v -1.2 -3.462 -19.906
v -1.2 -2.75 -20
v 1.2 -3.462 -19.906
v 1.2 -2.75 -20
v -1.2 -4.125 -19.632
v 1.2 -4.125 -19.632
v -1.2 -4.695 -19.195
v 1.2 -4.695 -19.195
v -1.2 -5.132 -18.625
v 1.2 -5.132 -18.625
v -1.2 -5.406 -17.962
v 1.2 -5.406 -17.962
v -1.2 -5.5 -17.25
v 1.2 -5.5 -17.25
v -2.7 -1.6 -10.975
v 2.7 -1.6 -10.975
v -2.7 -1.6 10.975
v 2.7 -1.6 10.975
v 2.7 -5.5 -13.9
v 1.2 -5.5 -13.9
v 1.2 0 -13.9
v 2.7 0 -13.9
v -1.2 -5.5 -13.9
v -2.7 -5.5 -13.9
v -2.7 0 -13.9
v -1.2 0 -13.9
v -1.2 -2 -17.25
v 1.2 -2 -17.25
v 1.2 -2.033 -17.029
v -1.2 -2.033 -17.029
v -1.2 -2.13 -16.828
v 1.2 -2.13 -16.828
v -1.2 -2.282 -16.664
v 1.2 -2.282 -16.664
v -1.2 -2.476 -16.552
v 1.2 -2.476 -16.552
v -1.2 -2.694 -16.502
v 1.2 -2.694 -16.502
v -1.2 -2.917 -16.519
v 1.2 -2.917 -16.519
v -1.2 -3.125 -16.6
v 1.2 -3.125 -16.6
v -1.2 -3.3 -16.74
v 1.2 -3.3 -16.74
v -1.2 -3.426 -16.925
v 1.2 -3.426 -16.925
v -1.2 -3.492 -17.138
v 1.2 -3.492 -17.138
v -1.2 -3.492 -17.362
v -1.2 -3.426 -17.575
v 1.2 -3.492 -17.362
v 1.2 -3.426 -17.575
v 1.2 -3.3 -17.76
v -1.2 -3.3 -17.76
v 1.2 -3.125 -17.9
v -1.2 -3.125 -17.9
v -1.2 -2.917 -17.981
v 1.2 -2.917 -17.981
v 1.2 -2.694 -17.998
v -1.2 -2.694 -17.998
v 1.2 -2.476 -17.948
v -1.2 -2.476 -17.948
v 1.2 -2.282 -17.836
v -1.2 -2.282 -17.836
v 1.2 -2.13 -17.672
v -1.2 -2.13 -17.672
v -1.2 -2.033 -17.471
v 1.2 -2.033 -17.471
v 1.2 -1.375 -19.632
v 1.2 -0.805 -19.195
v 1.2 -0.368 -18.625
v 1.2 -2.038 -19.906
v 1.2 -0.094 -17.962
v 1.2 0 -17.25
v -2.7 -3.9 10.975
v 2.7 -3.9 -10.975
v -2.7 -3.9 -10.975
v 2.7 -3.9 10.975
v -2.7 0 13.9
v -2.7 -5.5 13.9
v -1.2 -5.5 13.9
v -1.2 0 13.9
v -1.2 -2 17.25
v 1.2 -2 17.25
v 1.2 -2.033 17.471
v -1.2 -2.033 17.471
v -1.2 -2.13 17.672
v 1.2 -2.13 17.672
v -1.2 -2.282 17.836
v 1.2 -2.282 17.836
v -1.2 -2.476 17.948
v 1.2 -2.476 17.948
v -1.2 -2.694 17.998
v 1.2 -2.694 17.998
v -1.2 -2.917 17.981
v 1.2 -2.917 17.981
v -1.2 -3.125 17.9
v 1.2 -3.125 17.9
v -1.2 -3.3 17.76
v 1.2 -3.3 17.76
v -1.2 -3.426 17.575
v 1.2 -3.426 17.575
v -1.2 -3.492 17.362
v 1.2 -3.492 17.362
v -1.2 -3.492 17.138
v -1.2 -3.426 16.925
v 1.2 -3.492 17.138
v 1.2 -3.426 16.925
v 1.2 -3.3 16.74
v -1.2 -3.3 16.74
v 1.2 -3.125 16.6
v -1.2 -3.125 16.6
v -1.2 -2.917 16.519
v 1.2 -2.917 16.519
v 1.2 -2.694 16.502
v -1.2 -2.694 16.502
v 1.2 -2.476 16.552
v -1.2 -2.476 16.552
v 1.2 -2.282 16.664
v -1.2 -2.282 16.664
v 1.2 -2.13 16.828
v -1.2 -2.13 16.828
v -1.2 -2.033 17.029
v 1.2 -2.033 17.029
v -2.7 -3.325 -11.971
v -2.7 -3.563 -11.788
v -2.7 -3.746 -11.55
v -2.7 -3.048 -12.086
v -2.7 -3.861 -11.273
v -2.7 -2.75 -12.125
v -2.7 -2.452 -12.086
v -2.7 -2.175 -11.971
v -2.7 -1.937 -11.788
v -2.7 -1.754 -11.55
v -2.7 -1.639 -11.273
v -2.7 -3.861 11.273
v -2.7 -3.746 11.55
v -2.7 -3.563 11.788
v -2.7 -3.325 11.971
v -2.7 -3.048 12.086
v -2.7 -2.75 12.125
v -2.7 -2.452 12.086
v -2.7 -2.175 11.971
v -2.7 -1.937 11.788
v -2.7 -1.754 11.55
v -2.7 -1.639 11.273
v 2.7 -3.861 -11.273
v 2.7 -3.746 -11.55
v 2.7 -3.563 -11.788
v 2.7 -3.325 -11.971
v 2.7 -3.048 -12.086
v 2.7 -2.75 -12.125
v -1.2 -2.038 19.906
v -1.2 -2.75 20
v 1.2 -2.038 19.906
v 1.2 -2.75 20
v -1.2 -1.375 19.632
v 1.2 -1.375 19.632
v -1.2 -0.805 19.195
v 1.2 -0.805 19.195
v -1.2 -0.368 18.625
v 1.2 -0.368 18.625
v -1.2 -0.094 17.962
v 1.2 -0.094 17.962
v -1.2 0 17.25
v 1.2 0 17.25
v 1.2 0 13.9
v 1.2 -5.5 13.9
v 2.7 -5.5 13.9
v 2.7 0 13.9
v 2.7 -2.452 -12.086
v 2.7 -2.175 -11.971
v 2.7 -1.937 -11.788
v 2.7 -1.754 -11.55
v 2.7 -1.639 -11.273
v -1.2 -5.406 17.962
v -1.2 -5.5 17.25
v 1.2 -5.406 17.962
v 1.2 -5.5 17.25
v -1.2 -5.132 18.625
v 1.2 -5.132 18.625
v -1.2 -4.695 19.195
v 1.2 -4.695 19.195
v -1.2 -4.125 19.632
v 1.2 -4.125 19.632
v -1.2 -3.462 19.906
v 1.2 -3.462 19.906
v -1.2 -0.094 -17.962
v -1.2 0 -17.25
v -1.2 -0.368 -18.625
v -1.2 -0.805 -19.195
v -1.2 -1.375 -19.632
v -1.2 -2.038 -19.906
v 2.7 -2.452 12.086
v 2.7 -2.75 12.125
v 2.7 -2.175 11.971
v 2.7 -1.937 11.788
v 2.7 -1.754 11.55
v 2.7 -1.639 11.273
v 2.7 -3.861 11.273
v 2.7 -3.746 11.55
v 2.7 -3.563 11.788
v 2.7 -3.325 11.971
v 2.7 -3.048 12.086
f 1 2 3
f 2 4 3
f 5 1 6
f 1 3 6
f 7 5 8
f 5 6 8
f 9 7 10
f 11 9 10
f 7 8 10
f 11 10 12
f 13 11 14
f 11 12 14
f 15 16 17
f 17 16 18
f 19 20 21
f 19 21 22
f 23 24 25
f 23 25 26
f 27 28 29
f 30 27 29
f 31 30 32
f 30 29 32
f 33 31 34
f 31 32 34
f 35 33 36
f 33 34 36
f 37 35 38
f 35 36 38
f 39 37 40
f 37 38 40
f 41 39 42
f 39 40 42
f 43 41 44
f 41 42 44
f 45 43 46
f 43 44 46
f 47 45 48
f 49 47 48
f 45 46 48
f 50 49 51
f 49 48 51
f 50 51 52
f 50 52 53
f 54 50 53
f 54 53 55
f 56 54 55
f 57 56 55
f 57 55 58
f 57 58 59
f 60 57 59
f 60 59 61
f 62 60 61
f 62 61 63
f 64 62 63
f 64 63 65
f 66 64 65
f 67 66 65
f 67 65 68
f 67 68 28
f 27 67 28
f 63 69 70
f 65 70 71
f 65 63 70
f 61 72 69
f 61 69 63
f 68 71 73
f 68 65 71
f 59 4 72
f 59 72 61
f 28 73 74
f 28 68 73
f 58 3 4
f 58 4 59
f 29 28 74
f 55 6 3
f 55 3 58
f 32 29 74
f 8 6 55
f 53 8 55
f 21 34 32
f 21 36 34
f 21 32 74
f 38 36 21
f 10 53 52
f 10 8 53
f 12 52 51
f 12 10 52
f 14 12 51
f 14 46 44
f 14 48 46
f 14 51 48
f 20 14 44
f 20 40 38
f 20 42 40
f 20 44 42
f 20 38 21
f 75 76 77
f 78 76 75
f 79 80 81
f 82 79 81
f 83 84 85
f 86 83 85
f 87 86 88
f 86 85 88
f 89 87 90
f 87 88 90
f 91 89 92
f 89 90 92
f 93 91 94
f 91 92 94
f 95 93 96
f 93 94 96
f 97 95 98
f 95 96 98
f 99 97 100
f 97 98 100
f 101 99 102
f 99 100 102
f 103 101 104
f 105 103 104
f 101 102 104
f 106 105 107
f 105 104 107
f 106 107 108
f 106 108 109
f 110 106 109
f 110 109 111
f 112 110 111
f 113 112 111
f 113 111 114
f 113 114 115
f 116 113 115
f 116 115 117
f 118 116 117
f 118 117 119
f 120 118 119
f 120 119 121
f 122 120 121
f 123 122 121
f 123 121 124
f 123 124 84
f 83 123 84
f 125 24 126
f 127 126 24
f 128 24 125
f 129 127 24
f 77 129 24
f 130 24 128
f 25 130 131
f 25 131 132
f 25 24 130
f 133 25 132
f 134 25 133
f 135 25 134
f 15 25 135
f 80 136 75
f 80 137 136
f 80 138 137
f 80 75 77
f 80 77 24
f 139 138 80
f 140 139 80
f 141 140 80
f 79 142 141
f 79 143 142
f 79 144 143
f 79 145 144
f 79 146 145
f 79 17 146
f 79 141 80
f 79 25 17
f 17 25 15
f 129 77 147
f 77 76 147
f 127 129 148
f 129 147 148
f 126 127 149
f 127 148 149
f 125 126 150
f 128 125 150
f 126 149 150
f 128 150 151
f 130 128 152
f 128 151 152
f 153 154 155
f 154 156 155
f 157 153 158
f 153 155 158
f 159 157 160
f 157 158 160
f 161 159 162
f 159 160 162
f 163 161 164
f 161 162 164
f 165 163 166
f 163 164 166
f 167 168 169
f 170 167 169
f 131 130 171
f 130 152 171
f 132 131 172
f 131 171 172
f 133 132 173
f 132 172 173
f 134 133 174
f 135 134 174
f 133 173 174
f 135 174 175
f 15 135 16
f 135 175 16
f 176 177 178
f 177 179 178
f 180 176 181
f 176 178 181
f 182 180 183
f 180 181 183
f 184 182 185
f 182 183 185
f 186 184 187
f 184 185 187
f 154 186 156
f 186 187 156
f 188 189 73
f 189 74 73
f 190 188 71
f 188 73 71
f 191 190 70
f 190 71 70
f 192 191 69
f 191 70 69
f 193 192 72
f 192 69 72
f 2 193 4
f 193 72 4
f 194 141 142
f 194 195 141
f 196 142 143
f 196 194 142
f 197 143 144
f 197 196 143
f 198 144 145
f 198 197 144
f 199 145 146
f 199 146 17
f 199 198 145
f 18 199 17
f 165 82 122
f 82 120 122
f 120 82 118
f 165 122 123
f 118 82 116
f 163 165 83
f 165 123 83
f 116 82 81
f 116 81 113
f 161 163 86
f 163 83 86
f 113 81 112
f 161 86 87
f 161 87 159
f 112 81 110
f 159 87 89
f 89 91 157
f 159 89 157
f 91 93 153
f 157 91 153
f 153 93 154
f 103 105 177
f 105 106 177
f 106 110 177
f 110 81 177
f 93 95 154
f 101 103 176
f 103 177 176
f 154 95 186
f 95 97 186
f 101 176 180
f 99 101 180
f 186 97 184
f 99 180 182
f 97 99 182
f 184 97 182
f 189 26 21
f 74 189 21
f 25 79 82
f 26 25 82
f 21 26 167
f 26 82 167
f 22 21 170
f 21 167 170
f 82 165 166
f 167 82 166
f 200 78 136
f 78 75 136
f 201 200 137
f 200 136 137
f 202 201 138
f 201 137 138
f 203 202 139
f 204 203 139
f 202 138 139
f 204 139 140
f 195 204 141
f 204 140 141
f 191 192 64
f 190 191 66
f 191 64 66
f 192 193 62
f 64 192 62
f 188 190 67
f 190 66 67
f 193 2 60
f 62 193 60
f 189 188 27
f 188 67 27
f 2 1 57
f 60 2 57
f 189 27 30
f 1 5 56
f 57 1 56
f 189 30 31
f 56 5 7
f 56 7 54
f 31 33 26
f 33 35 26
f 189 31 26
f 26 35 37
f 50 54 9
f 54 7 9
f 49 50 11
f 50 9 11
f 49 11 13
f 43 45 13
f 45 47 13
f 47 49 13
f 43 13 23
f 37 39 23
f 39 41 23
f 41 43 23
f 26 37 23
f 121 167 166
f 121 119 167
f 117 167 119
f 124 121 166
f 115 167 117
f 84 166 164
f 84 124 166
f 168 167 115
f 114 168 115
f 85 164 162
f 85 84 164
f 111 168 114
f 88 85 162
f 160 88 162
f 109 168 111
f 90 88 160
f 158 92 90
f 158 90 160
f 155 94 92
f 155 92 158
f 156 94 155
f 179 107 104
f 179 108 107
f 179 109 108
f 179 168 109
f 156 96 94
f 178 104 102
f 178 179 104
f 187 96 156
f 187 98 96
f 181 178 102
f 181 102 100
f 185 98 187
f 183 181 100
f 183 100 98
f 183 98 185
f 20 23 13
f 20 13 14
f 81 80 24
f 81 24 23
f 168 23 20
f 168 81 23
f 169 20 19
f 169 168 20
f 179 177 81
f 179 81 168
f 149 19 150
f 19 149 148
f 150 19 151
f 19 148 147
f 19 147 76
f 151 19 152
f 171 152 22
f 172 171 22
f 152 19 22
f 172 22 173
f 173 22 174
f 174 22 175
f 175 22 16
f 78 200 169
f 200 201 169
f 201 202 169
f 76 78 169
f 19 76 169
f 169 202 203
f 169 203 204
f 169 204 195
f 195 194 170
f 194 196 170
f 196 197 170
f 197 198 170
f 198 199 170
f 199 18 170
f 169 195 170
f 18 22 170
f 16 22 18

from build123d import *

# Parameters (mm, degrees)
F0_W      = 5.4
F0_H      = 40
F1_DEPTH  = 5.5
F2_W      = 1.5
F2_H      = 6.1
F3_DEPTH  = 5.501
F4_W      = 1.5
F4_H      = 6.1
F5_DEPTH  = 25
F6_W      = 1.5
F6_H      = 6.1
F7_DEPTH  = 5.501
F8_W      = 1.5
F8_H      = 6.1
F9_DEPTH  = 5.501
F10_R     = 2.75
F11_R     = 2.74999
F12_R     = 2.75
F13_R     = 2.74999
F14_W     = 2.3
F14_H     = 24.25
F15_DEPTH = 2.701
F16_DEPTH = 2.701
F17_R     = 1.15
F18_R     = 1.14999
F19_R     = 1.15
F20_R     = 1.14999
F21_R     = 0.75
F22_DEPTH = 3.901
F23_R     = 0.75
F24_DEPTH = 3.901


# Not quite as in the source:
# - a fillet or chamfer is up to 0.001 mm smaller than in the source, because OpenCascade refuses the exact size


with BuildPart() as f1:
    # F0 (on Front) → F1 (new body)
    with BuildSketch(Plane.XZ):
        Rectangle(F0_W, F0_H)
    extrude(amount=F1_DEPTH)

    # F2 (on face) → F3 (cut, through all)
    with BuildSketch(Plane.XZ.offset(5.5)):
        with Locations((-1.95, 16.95)):
            Rectangle(F2_W, F2_H)
    extrude(amount=-F3_DEPTH, mode=Mode.SUBTRACT)

    # F4 (on face) → F5 (cut)
    with BuildSketch(Plane.XZ.offset(5.5)):
        with Locations((1.95, 16.95)):
            Rectangle(F4_W, F4_H)
    extrude(amount=-F5_DEPTH, mode=Mode.SUBTRACT)

    # F6 (on face) → F7 (cut, through all)
    with BuildSketch(Plane.XZ.offset(5.5)):
        with Locations((-1.95, -16.95)):
            Rectangle(F6_W, F6_H)
    extrude(amount=-F7_DEPTH, mode=Mode.SUBTRACT)

    # F8 (on face) → F9 (cut, through all)
    with BuildSketch(Plane.XZ.offset(5.5)):
        with Locations((1.95, -16.95)):
            Rectangle(F8_W, F8_H)
    extrude(amount=-F9_DEPTH, mode=Mode.SUBTRACT)

    # F10
    f10_edges = [f1.edges().sort_by_distance(p)[0] for p in [
        (0, -5.5, 20),
    ]]
    fillet(f10_edges, radius=F10_R)

    # F11 (radius 2.75 in the source; OpenCascade refuses exactly that, so slightly less here)
    f11_edges = [f1.edges().sort_by_distance(p)[0] for p in [
        (0, 0, 20),
    ]]
    fillet(f11_edges, radius=F11_R)

    # F12
    f12_edges = [f1.edges().sort_by_distance(p)[0] for p in [
        (0, 0, -20),
    ]]
    fillet(f12_edges, radius=F12_R)

    # F13 (radius 2.75 in the source; OpenCascade refuses exactly that, so slightly less here)
    f13_edges = [f1.edges().sort_by_distance(p)[0] for p in [
        (0, -5.5, -20),
    ]]
    fillet(f13_edges, radius=F13_R)

    # F14 (on Right) → F15 (cut, through all)
    with BuildSketch(Plane.YZ):
        with Locations((-2.75, 0)):
            Rectangle(F14_W, F14_H)
    extrude(amount=-F15_DEPTH, mode=Mode.SUBTRACT)

    # F14 (on Right) → F16 (cut, through all)
    with BuildSketch(Plane.YZ):
        with Locations((-2.75, 0)):
            Rectangle(F14_W, F14_H)
    extrude(amount=F16_DEPTH, mode=Mode.SUBTRACT)

    # F17
    f17_edges = [f1.edges().sort_by_distance(p)[0] for p in [
        (0, -3.9, 12.125),
    ]]
    fillet(f17_edges, radius=F17_R)

    # F18 (radius 1.15 in the source; OpenCascade refuses exactly that, so slightly less here)
    f18_edges = [f1.edges().sort_by_distance(p)[0] for p in [
        (0, -1.6, 12.125),
    ]]
    fillet(f18_edges, radius=F18_R)

    # F19
    f19_edges = [f1.edges().sort_by_distance(p)[0] for p in [
        (0, -3.9, -12.125),
    ]]
    fillet(f19_edges, radius=F19_R)

    # F20 (radius 1.15 in the source; OpenCascade refuses exactly that, so slightly less here)
    f20_edges = [f1.edges().sort_by_distance(p)[0] for p in [
        (0, -1.6, -12.125),
    ]]
    fillet(f20_edges, radius=F20_R)

    # F21 (on face) → F22 (cut, through all)
    with BuildSketch(Plane.YZ.offset(1.2)):
        with Locations((-2.75, 17.25)):
            Circle(F21_R)
    extrude(amount=-F22_DEPTH, mode=Mode.SUBTRACT)

    # F23 (on face) → F24 (cut, through all)
    with BuildSketch(Plane.YZ.offset(1.2)):
        with Locations((-2.75, -17.25)):
            Circle(F23_R)
    extrude(amount=-F24_DEPTH, mode=Mode.SUBTRACT)


solid = f1.part
